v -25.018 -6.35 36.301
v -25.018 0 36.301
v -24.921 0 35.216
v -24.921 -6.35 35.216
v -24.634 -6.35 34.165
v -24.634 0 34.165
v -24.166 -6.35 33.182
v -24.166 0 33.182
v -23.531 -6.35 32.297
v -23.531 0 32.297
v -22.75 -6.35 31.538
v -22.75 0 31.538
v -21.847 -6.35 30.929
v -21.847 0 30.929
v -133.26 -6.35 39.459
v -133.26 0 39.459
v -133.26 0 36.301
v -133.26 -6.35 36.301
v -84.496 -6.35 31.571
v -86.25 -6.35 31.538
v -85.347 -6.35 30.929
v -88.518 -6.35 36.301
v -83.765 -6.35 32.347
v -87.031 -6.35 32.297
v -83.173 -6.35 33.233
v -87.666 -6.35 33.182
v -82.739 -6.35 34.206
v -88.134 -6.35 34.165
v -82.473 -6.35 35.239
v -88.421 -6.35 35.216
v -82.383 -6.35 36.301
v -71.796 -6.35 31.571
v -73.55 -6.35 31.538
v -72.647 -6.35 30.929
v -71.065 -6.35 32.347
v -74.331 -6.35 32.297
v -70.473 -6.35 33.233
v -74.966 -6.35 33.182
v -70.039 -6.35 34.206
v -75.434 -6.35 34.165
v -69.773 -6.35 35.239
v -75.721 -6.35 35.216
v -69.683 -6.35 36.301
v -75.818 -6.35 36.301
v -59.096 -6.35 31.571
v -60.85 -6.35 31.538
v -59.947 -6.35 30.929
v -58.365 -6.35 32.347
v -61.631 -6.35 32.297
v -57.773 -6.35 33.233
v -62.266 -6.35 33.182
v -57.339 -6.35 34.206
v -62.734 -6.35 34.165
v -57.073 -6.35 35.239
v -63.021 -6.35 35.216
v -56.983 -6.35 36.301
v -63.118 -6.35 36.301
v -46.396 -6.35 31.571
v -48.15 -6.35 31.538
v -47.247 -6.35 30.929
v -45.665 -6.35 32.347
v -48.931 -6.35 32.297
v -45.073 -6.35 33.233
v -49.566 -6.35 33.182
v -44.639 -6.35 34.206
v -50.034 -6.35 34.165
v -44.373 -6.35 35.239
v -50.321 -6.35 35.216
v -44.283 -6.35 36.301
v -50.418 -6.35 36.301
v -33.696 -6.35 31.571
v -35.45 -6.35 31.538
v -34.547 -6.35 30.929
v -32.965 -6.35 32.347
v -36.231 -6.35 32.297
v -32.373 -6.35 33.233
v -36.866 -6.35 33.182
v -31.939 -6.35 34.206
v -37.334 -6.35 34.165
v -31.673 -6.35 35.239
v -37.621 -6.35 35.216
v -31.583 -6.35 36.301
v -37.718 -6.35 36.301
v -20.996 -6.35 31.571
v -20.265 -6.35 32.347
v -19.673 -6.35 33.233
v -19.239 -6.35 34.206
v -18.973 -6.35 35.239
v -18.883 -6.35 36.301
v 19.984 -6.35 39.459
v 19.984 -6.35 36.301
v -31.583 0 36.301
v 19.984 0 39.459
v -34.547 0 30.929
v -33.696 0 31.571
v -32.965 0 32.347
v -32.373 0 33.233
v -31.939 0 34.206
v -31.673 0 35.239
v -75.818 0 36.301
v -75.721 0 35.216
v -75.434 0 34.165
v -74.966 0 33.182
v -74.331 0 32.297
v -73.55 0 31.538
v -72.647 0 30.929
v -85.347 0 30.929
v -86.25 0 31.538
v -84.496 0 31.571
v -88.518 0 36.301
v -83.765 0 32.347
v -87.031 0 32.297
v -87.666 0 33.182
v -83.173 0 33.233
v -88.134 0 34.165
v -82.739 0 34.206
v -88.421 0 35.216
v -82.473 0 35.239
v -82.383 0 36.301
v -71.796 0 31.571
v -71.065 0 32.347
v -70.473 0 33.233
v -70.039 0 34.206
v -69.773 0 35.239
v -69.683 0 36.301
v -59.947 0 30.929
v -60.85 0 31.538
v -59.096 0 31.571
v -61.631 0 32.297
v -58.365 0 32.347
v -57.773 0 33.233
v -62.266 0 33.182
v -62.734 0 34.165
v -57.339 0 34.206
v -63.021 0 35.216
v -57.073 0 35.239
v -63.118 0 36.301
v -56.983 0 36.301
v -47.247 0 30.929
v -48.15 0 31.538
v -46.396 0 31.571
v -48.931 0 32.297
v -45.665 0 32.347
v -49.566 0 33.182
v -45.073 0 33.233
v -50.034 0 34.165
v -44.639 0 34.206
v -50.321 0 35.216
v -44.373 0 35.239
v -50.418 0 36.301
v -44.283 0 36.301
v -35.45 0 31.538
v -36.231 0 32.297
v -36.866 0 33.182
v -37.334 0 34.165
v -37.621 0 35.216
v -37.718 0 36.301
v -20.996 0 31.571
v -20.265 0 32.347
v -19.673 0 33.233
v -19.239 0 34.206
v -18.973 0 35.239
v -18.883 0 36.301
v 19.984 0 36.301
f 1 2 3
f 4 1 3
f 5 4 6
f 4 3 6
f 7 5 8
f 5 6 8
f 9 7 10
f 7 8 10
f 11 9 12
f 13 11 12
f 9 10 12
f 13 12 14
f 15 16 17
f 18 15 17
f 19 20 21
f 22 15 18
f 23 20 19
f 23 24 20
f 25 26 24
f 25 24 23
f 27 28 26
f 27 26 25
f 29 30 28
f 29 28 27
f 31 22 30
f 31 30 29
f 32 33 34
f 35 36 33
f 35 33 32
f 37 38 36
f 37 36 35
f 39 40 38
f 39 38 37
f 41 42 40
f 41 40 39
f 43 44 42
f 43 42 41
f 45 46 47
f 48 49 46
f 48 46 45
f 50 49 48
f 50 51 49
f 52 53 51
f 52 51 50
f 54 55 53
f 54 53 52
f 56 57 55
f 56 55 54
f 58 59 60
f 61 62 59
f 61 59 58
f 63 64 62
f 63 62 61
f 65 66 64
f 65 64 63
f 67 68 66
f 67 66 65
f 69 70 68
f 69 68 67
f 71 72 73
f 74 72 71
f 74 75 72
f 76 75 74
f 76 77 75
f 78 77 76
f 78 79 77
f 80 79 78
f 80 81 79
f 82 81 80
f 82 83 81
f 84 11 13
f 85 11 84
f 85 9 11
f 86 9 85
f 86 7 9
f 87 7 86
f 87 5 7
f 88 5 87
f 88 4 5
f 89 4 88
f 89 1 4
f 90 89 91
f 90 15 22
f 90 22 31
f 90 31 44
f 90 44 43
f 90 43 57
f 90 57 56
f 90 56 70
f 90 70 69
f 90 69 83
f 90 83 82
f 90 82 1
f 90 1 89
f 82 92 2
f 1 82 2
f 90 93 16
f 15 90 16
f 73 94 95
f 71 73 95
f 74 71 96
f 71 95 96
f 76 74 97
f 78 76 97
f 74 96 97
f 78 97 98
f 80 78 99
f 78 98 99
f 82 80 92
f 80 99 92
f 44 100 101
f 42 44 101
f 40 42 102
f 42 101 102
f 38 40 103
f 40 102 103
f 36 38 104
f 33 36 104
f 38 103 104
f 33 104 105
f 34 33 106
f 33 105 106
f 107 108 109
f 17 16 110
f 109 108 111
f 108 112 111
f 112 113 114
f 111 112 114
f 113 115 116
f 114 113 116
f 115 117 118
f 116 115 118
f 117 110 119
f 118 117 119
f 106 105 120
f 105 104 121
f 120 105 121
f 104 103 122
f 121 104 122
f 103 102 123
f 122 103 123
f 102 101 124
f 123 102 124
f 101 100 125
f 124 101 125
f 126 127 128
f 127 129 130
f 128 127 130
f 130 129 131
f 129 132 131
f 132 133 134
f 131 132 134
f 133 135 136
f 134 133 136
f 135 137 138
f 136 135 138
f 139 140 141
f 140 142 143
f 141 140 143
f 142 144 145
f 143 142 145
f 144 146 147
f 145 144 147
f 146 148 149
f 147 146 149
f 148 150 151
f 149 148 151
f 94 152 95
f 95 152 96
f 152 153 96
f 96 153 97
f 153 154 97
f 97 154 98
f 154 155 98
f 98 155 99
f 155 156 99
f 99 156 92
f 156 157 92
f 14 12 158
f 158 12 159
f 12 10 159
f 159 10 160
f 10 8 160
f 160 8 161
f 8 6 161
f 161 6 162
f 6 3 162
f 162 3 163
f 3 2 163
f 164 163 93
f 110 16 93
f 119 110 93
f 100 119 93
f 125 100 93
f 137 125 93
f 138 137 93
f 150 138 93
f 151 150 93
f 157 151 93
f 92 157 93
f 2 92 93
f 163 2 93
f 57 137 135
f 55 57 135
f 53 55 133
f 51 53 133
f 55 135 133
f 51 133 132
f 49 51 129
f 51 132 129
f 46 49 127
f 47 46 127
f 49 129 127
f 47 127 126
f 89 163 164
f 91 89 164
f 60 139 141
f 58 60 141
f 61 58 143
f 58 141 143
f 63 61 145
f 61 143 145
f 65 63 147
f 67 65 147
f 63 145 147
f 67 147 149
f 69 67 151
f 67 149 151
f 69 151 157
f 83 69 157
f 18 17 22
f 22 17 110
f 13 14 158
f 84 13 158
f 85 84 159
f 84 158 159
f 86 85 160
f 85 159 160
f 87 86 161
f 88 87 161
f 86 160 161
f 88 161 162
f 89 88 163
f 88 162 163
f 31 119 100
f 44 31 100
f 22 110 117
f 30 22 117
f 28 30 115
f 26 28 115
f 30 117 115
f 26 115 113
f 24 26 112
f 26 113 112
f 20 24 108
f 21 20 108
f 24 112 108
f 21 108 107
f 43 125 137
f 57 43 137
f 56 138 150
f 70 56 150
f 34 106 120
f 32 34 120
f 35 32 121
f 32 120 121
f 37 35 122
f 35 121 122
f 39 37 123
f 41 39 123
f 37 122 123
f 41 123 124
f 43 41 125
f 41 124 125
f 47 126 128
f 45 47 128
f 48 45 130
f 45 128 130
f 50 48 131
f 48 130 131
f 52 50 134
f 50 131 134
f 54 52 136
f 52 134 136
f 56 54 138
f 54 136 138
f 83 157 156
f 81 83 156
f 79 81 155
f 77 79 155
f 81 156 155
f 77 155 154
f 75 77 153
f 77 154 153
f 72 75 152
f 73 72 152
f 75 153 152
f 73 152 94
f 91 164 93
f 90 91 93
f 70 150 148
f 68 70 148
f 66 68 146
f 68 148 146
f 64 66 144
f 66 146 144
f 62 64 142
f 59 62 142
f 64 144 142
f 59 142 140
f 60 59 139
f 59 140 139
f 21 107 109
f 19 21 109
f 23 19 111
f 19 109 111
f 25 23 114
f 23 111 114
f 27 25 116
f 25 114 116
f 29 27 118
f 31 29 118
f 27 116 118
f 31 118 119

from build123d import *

# Parameters (mm, degrees)
F1_DEPTH = 6.35


# Not quite as in the source:
# - a feature names something its author has since deleted; it is built from what else it names


with BuildPart() as f1:
    # F0 (on Front) → F1 (new body)
    with BuildSketch(Plane.XZ):
        with BuildLine():
            Line((-82.3832392616, 36.3007842489), (-88.5181630436, 36.3007842489))
            ThreePointArc((-88.5181630436, 36.3007842489), (-87.6661618487, 33.1818070528), (-85.3468053884, 30.9291396569))
            ThreePointArc((-85.3468053884, 30.9291396569), (-83.1732772521, 33.2333223579), (-82.3832392616, 36.3007842489))
        make_face()
        with BuildLine():
            Line((-69.6832392616, 36.3007842489), (-75.8181630436, 36.3007842489))
            ThreePointArc((-75.8181630436, 36.3007842489), (-74.9661618487, 33.1818070528), (-72.6468053884, 30.9291396569))
            ThreePointArc((-72.6468053884, 30.9291396569), (-70.4732772521, 33.2333223579), (-69.6832392616, 36.3007842489))
        make_face()
        with BuildLine():
            Line((-56.9832392616, 36.3007842489), (-63.1181630436, 36.3007842489))
            ThreePointArc((-63.1181630436, 36.3007842489), (-62.2661618487, 33.1818070528), (-59.9468053884, 30.9291396569))
            ThreePointArc((-59.9468053884, 30.9291396569), (-57.7732772521, 33.2333223579), (-56.9832392616, 36.3007842489))
        make_face()
        with BuildLine():
            Line((-44.2832392616, 36.3007842489), (-50.4181630436, 36.3007842489))
            ThreePointArc((-50.4181630436, 36.3007842489), (-49.5661618487, 33.1818070528), (-47.2468053884, 30.9291396569))
            ThreePointArc((-47.2468053884, 30.9291396569), (-45.0732772521, 33.2333223579), (-44.2832392616, 36.3007842489))
        make_face()
        with BuildLine():
            Line((-31.5832392616, 36.3007842489), (-37.7181630436, 36.3007842489))
            ThreePointArc((-37.7181630436, 36.3007842489), (-36.8661618487, 33.1818070528), (-34.5468053884, 30.9291396569))
            ThreePointArc((-34.5468053884, 30.9291396569), (-32.3732772521, 33.2333223579), (-31.5832392616, 36.3007842489))
        make_face()
        with BuildLine():
            Line((-18.8832392616, 36.3007842489), (-25.0181630436, 36.3007842489))
            ThreePointArc((-25.0181630436, 36.3007842489), (-24.1661618487, 33.1818070528), (-21.8468053884, 30.9291396569))
            ThreePointArc((-21.8468053884, 30.9291396569), (-19.6732772521, 33.2333223579), (-18.8832392616, 36.3007842489))
        make_face()
        Polygon((-117.1290501952, 36.3007842489), (-100.1673217514, 36.3007842489), (-88.5181630436, 36.3007842489), (-82.3832392616, 36.3007842489), (-75.8181630436, 36.3007842489), (-69.6832392616, 36.3007842489), (-63.1181630436, 36.3007842489), (-56.9832392616, 36.3007842489), (-50.4181630436, 36.3007842489), (-44.2832392616, 36.3007842489), (-37.7181630436, 36.3007842489), (-31.5832392616, 36.3007842489), (-25.0181630436, 36.3007842489), (-18.8832392616, 36.3007842489), (1.4326782486, 36.3007842489), (15.6819988042, 36.3007842489), (19.9843030423, 36.3007842489), (19.9843030423, 39.4588721526), (6.4166695811, 39.4588721526), (1.4326782486, 39.4588721526), (-106.9938540459, 39.4588721526), (-120.9527105093, 39.4588721526), (-133.2595199347, 39.4588721526), (-133.2595199347, 36.3007842489), (-127.7280002832, 36.3007842489), align=None)
    extrude(amount=F1_DEPTH)


solid = f1.part
